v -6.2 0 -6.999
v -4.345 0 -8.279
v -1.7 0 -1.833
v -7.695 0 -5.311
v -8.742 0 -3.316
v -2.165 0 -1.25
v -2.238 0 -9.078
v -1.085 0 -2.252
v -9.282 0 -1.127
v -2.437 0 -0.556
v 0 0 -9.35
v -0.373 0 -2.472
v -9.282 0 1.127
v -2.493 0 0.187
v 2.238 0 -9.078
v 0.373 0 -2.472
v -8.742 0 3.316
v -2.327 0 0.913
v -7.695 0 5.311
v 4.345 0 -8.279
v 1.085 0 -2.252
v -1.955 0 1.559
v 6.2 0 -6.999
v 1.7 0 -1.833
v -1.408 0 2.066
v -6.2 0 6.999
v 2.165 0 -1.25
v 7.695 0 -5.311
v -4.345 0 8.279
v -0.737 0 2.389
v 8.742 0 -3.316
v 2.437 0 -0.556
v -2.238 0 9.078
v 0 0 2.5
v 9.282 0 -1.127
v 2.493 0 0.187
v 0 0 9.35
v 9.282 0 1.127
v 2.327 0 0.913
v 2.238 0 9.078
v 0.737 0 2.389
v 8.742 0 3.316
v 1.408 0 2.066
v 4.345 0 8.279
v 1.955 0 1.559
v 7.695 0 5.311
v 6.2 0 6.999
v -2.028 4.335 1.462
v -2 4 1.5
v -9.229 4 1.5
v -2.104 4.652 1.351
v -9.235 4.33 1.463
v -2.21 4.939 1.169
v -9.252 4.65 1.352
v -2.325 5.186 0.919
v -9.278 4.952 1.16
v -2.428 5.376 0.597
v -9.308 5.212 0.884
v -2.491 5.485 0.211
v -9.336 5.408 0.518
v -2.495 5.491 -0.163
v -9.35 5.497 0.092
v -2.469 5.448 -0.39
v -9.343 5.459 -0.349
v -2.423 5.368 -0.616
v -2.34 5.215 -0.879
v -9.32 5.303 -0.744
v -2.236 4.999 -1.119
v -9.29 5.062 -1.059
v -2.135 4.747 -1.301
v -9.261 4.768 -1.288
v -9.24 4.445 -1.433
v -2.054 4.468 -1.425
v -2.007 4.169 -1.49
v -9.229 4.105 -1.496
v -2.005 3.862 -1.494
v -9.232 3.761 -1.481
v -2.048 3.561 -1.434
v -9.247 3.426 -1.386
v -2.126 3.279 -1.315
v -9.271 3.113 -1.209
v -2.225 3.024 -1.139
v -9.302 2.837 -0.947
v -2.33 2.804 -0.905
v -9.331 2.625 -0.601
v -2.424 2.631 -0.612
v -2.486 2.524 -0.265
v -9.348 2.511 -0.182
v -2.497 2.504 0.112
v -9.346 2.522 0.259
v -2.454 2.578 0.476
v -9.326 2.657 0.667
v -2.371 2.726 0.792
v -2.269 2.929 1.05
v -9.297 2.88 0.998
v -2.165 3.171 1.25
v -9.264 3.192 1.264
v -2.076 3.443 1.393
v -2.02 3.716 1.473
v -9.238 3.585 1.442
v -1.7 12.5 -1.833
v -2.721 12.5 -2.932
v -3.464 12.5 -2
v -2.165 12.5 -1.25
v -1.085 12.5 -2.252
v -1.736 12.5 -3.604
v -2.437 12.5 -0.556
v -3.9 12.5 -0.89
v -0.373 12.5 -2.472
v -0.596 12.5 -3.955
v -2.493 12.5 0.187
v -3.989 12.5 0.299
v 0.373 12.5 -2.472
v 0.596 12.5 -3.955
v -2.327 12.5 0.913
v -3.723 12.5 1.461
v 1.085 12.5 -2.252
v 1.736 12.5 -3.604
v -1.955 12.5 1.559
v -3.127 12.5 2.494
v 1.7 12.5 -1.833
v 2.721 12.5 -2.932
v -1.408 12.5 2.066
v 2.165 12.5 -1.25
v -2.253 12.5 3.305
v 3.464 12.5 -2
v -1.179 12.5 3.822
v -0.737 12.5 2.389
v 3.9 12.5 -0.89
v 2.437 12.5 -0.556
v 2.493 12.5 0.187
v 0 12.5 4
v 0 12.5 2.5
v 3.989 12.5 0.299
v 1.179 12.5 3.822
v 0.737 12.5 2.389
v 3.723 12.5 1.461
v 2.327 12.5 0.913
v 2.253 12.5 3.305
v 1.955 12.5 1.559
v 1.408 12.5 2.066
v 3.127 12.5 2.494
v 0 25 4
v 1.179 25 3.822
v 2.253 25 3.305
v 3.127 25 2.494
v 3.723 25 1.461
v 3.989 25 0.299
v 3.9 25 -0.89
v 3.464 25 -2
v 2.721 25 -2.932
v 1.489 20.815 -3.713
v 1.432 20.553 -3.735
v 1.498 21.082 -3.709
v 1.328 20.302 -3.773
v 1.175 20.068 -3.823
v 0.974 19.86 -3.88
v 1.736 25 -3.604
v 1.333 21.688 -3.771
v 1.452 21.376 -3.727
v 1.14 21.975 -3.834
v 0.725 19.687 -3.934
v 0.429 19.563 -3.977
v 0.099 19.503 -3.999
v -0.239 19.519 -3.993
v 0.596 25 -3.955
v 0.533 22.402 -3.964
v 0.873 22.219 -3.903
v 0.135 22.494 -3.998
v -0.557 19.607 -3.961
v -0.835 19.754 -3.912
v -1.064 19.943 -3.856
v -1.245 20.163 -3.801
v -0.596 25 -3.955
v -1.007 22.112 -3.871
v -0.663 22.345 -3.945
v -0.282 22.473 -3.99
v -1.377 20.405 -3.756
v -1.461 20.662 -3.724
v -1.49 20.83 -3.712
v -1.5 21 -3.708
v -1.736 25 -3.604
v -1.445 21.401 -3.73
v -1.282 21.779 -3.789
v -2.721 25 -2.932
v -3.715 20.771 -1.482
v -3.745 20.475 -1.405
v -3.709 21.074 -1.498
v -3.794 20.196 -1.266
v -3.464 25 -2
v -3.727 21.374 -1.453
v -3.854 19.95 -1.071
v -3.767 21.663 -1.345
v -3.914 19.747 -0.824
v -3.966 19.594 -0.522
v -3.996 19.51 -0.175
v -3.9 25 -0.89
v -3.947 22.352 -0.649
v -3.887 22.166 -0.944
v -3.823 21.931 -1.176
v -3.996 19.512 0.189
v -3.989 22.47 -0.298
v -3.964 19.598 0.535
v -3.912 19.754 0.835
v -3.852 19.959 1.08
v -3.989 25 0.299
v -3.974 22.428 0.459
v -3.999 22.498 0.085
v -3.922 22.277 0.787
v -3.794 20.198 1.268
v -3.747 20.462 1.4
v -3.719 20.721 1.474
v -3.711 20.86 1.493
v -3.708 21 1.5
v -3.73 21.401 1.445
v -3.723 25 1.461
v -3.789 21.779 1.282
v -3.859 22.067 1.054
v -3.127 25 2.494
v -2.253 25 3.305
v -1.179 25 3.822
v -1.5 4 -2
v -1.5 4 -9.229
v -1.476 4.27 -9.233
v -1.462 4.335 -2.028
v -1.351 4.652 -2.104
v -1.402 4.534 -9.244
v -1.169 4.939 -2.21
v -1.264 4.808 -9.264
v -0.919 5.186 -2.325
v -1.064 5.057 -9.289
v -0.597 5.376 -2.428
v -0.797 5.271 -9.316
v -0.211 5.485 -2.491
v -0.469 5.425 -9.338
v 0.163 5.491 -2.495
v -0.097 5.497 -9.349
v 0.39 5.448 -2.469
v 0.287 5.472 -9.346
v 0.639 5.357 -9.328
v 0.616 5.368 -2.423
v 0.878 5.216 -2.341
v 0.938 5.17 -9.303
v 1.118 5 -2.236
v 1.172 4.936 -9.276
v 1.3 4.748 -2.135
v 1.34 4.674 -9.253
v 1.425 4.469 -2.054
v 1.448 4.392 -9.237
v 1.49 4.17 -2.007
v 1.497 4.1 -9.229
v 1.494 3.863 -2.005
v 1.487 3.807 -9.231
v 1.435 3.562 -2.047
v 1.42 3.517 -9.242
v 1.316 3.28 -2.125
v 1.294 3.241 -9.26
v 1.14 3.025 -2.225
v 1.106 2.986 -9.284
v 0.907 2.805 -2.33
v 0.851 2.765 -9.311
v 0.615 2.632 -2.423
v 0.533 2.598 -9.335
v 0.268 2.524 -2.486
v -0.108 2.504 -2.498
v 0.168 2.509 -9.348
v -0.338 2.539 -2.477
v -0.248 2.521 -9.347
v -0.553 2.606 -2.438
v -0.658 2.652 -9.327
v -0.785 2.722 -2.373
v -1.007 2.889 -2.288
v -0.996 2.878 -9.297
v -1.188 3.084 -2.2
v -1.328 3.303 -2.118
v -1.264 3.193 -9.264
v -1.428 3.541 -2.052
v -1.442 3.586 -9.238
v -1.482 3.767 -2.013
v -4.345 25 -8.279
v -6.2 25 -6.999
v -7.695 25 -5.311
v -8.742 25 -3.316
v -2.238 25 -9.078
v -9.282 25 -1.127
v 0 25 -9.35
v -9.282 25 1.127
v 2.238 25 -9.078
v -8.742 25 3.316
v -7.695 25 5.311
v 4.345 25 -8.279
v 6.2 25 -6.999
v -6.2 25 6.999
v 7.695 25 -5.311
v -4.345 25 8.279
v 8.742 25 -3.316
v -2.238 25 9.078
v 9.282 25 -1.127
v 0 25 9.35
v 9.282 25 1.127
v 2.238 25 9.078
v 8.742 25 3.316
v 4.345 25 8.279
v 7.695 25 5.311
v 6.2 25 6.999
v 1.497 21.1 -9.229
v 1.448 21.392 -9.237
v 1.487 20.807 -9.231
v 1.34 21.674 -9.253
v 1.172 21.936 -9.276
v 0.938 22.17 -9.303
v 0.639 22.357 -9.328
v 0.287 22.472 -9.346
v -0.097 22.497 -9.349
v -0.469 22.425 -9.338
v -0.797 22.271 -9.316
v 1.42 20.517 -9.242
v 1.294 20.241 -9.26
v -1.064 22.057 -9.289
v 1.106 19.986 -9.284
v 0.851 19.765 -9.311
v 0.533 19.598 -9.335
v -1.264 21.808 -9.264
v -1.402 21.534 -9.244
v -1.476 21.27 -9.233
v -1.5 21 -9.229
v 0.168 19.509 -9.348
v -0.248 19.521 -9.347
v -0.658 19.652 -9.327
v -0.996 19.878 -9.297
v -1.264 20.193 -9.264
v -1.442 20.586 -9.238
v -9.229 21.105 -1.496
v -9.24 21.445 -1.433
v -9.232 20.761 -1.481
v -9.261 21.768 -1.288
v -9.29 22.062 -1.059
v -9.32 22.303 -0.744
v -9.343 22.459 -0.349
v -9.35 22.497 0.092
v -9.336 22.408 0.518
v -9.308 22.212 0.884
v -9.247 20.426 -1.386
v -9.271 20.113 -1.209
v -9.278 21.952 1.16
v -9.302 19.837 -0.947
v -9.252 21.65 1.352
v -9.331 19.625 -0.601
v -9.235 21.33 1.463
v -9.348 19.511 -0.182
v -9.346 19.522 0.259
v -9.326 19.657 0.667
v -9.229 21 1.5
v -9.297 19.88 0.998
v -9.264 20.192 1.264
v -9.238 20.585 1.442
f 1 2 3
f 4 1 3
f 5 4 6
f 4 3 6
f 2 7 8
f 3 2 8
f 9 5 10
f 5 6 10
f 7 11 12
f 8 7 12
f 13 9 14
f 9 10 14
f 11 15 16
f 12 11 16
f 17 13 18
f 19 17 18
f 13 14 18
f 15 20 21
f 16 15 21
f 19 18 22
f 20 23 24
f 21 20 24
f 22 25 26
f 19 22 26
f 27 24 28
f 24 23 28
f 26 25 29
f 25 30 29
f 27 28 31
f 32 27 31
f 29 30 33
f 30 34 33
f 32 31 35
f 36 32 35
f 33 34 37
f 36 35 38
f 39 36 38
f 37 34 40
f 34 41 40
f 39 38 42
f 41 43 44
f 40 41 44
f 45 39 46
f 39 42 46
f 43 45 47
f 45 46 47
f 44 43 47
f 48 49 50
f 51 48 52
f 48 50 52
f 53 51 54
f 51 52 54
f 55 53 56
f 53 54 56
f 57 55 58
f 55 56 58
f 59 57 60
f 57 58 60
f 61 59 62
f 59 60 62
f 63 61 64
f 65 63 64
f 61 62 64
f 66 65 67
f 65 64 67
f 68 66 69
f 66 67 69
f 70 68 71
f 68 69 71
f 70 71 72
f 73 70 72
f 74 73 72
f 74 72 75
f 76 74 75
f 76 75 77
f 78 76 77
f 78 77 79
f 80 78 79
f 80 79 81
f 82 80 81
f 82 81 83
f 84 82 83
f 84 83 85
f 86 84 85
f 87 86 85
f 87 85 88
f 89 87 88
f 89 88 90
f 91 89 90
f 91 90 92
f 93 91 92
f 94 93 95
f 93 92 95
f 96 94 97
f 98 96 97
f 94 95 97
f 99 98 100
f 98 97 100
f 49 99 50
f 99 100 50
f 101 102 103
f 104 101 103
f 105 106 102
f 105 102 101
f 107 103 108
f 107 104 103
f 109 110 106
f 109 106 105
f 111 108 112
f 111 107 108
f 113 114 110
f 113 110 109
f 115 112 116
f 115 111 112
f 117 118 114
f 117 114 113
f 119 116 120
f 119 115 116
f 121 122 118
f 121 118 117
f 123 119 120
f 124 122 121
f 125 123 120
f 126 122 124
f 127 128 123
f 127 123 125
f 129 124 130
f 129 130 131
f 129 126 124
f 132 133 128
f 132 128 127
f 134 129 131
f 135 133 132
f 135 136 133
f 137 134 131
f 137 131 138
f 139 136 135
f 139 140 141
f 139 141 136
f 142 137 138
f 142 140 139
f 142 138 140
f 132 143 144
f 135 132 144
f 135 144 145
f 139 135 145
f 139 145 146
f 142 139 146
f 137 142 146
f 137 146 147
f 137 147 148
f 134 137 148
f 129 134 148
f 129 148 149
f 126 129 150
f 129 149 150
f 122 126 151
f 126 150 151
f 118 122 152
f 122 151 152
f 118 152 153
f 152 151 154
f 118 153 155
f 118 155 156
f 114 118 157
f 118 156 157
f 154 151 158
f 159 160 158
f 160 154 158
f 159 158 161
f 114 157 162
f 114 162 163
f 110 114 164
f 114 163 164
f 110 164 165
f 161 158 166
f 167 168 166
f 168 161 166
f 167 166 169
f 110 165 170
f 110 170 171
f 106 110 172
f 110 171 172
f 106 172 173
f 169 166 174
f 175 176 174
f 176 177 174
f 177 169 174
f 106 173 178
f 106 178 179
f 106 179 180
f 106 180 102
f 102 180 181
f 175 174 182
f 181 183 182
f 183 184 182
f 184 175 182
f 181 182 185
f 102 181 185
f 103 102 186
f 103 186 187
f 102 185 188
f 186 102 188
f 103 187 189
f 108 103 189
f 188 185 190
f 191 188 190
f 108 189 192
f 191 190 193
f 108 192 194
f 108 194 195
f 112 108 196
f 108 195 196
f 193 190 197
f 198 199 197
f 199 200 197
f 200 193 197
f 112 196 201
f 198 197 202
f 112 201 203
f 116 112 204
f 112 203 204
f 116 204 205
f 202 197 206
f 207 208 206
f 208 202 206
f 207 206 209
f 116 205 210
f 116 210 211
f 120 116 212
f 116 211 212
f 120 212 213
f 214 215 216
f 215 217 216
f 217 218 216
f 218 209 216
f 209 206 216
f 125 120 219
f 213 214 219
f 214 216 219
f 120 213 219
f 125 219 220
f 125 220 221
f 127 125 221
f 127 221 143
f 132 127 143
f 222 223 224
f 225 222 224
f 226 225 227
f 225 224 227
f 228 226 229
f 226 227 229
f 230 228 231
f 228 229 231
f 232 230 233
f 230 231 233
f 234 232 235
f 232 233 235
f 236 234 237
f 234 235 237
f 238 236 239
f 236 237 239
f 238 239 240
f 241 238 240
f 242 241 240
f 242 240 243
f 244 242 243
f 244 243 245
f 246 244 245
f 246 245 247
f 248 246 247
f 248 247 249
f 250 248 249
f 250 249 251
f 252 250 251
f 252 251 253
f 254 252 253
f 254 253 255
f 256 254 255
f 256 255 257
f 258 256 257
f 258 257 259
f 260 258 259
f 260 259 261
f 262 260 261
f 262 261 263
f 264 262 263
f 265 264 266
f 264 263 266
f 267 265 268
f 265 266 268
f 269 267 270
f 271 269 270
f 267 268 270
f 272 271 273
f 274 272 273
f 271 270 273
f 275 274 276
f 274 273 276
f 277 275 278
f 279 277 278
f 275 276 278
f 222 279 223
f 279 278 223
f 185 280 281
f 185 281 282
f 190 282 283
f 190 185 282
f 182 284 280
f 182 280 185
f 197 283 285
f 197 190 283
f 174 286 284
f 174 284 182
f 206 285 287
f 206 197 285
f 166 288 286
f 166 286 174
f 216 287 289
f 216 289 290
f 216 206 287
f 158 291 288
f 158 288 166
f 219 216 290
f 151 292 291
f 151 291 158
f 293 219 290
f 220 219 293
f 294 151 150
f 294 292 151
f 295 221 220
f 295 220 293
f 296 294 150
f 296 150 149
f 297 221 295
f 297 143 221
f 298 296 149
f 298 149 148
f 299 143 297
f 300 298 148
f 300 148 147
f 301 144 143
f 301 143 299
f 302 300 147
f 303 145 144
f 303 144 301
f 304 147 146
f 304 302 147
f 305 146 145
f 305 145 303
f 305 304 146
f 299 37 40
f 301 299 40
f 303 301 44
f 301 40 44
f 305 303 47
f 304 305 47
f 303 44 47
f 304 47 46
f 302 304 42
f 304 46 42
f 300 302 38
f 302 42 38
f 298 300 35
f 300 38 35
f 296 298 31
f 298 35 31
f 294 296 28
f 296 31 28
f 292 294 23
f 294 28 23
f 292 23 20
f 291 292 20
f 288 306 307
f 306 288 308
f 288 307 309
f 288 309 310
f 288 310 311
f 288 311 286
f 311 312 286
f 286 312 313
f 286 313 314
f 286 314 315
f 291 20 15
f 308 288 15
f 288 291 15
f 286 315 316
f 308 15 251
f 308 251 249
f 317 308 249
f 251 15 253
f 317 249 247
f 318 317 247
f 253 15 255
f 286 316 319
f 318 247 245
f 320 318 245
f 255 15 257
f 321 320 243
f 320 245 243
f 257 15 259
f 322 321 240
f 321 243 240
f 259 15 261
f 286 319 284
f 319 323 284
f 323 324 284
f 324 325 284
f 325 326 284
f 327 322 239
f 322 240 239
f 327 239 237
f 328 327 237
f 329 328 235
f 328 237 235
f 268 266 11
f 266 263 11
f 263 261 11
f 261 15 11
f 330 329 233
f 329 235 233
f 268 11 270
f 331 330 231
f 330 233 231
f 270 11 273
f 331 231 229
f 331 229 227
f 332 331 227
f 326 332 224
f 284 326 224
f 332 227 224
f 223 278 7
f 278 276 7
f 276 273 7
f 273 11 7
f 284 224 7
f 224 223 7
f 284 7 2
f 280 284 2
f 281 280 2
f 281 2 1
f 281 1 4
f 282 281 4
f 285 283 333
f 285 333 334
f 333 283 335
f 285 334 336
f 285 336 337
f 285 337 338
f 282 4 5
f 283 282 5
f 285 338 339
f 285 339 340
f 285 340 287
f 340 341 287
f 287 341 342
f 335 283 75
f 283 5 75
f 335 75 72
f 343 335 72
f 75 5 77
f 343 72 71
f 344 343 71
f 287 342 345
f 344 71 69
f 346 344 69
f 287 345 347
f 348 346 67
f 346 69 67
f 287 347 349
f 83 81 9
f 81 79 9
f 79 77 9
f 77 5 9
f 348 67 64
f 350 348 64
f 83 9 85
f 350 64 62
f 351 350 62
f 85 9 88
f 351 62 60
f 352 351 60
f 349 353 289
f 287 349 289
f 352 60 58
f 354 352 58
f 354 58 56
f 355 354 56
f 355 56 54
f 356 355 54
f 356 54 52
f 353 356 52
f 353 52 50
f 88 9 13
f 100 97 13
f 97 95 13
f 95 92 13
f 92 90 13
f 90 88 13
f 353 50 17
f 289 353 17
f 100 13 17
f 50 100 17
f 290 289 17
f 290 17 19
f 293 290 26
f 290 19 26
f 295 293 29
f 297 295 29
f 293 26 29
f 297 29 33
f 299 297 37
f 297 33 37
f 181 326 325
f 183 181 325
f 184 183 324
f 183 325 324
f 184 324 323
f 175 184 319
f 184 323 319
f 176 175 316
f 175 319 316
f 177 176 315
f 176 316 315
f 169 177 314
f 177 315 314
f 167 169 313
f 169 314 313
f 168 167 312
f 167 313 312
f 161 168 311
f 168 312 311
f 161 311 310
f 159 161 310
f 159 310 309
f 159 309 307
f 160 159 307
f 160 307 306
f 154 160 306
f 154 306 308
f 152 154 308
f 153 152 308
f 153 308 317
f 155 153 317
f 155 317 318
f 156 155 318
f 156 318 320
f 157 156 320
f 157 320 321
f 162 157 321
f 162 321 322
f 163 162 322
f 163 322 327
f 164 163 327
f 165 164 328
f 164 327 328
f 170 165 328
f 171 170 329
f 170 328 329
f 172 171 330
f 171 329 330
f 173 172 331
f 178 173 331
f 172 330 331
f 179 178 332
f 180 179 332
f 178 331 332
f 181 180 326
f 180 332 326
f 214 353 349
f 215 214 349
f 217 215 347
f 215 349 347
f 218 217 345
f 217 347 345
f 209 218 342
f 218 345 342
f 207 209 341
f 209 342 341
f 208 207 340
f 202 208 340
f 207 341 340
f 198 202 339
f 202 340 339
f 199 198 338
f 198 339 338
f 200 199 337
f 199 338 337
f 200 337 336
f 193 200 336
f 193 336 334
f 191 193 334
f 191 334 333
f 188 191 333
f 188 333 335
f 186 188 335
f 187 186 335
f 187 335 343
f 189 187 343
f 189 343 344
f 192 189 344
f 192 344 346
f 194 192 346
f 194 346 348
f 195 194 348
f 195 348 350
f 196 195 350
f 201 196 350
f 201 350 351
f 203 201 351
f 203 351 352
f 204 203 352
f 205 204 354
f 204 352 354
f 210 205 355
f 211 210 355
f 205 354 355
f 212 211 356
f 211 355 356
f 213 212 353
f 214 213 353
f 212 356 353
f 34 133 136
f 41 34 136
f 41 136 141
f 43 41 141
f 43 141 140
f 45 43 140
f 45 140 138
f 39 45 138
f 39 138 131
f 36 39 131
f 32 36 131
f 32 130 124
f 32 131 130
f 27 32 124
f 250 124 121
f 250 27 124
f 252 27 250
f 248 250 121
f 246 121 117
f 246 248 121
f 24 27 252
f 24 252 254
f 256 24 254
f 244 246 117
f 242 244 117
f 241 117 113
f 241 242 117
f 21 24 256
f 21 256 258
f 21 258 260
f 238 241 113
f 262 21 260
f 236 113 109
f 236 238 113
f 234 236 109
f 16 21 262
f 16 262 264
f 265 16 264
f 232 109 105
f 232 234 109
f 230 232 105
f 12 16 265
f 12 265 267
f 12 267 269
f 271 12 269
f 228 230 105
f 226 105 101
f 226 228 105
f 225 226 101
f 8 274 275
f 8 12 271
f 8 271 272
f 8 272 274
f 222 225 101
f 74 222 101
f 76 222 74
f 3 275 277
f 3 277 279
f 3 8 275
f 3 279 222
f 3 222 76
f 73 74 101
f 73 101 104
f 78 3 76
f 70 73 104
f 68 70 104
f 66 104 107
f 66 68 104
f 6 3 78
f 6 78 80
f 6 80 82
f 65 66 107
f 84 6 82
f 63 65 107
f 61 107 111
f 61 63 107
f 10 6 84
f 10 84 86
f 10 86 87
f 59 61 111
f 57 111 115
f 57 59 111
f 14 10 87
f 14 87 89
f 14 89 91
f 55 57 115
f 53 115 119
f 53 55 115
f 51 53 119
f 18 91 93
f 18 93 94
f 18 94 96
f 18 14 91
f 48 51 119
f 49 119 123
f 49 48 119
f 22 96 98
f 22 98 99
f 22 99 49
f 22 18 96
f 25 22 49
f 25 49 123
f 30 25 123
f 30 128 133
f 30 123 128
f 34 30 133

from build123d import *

# Parameters (mm, degrees)
SKETCH1_R           = 9.35
SKETCH1_R_2         = 2.5
BOSS_EXTRUDE1_DEPTH = 25
SKETCH2_R           = 4
CUT_EXTRUDE1_DEPTH  = 12.5
SKETCH3_R           = 1.5
CUT_EXTRUDE2_DEPTH  = 8
CIRPATTERN1_COUNT   = 2
CIRPATTERN1_ANGLE   = 90


with BuildPart() as part:
    # Sketch1 → Boss-Extrude1 (new body)
    with BuildSketch(Plane(origin=(0, 0, 0), x_dir=(1, 0, 0), z_dir=(0, 1, 0))):
        with Locations(Location((0, 0, 0), (0, 0, 270))):
            Circle(SKETCH1_R)
        with Locations(Location((0, 0, 0), (0, 0, 270))):
            Circle(SKETCH1_R_2, mode=Mode.SUBTRACT)
    extrude(amount=BOSS_EXTRUDE1_DEPTH)

    # Sketch2 → Cut-Extrude1 (cut)
    with BuildSketch(Plane(origin=(0, 25, 0), x_dir=(1, 0, 0), z_dir=(0, 1, 0))):
        with Locations(Location((0, 0, 0), (0, 0, 270))):
            Circle(SKETCH2_R)
    extrude(amount=-CUT_EXTRUDE1_DEPTH, mode=Mode.SUBTRACT)

    # Sketch3 → Cut-Extrude2 (cut)
    with BuildSketch(Plane.ZY.offset(9.35)):
        with Locations((0, 21)):
            Circle(SKETCH3_R)
        with Locations((0, 4)):
            Circle(SKETCH3_R)
    cut_extrude2 = extrude(amount=-CUT_EXTRUDE2_DEPTH, mode=Mode.SUBTRACT)

    # CirPattern1: Cut-Extrude2 ×2 about axis
    cirpattern1_axis = Axis((0, 12.5, 0), (0, -1, 0))
    for i in range(1, CIRPATTERN1_COUNT):
        add(cut_extrude2.rotate(cirpattern1_axis, i * CIRPATTERN1_ANGLE / (CIRPATTERN1_COUNT - 1)), mode=Mode.SUBTRACT)


solid = part.part
